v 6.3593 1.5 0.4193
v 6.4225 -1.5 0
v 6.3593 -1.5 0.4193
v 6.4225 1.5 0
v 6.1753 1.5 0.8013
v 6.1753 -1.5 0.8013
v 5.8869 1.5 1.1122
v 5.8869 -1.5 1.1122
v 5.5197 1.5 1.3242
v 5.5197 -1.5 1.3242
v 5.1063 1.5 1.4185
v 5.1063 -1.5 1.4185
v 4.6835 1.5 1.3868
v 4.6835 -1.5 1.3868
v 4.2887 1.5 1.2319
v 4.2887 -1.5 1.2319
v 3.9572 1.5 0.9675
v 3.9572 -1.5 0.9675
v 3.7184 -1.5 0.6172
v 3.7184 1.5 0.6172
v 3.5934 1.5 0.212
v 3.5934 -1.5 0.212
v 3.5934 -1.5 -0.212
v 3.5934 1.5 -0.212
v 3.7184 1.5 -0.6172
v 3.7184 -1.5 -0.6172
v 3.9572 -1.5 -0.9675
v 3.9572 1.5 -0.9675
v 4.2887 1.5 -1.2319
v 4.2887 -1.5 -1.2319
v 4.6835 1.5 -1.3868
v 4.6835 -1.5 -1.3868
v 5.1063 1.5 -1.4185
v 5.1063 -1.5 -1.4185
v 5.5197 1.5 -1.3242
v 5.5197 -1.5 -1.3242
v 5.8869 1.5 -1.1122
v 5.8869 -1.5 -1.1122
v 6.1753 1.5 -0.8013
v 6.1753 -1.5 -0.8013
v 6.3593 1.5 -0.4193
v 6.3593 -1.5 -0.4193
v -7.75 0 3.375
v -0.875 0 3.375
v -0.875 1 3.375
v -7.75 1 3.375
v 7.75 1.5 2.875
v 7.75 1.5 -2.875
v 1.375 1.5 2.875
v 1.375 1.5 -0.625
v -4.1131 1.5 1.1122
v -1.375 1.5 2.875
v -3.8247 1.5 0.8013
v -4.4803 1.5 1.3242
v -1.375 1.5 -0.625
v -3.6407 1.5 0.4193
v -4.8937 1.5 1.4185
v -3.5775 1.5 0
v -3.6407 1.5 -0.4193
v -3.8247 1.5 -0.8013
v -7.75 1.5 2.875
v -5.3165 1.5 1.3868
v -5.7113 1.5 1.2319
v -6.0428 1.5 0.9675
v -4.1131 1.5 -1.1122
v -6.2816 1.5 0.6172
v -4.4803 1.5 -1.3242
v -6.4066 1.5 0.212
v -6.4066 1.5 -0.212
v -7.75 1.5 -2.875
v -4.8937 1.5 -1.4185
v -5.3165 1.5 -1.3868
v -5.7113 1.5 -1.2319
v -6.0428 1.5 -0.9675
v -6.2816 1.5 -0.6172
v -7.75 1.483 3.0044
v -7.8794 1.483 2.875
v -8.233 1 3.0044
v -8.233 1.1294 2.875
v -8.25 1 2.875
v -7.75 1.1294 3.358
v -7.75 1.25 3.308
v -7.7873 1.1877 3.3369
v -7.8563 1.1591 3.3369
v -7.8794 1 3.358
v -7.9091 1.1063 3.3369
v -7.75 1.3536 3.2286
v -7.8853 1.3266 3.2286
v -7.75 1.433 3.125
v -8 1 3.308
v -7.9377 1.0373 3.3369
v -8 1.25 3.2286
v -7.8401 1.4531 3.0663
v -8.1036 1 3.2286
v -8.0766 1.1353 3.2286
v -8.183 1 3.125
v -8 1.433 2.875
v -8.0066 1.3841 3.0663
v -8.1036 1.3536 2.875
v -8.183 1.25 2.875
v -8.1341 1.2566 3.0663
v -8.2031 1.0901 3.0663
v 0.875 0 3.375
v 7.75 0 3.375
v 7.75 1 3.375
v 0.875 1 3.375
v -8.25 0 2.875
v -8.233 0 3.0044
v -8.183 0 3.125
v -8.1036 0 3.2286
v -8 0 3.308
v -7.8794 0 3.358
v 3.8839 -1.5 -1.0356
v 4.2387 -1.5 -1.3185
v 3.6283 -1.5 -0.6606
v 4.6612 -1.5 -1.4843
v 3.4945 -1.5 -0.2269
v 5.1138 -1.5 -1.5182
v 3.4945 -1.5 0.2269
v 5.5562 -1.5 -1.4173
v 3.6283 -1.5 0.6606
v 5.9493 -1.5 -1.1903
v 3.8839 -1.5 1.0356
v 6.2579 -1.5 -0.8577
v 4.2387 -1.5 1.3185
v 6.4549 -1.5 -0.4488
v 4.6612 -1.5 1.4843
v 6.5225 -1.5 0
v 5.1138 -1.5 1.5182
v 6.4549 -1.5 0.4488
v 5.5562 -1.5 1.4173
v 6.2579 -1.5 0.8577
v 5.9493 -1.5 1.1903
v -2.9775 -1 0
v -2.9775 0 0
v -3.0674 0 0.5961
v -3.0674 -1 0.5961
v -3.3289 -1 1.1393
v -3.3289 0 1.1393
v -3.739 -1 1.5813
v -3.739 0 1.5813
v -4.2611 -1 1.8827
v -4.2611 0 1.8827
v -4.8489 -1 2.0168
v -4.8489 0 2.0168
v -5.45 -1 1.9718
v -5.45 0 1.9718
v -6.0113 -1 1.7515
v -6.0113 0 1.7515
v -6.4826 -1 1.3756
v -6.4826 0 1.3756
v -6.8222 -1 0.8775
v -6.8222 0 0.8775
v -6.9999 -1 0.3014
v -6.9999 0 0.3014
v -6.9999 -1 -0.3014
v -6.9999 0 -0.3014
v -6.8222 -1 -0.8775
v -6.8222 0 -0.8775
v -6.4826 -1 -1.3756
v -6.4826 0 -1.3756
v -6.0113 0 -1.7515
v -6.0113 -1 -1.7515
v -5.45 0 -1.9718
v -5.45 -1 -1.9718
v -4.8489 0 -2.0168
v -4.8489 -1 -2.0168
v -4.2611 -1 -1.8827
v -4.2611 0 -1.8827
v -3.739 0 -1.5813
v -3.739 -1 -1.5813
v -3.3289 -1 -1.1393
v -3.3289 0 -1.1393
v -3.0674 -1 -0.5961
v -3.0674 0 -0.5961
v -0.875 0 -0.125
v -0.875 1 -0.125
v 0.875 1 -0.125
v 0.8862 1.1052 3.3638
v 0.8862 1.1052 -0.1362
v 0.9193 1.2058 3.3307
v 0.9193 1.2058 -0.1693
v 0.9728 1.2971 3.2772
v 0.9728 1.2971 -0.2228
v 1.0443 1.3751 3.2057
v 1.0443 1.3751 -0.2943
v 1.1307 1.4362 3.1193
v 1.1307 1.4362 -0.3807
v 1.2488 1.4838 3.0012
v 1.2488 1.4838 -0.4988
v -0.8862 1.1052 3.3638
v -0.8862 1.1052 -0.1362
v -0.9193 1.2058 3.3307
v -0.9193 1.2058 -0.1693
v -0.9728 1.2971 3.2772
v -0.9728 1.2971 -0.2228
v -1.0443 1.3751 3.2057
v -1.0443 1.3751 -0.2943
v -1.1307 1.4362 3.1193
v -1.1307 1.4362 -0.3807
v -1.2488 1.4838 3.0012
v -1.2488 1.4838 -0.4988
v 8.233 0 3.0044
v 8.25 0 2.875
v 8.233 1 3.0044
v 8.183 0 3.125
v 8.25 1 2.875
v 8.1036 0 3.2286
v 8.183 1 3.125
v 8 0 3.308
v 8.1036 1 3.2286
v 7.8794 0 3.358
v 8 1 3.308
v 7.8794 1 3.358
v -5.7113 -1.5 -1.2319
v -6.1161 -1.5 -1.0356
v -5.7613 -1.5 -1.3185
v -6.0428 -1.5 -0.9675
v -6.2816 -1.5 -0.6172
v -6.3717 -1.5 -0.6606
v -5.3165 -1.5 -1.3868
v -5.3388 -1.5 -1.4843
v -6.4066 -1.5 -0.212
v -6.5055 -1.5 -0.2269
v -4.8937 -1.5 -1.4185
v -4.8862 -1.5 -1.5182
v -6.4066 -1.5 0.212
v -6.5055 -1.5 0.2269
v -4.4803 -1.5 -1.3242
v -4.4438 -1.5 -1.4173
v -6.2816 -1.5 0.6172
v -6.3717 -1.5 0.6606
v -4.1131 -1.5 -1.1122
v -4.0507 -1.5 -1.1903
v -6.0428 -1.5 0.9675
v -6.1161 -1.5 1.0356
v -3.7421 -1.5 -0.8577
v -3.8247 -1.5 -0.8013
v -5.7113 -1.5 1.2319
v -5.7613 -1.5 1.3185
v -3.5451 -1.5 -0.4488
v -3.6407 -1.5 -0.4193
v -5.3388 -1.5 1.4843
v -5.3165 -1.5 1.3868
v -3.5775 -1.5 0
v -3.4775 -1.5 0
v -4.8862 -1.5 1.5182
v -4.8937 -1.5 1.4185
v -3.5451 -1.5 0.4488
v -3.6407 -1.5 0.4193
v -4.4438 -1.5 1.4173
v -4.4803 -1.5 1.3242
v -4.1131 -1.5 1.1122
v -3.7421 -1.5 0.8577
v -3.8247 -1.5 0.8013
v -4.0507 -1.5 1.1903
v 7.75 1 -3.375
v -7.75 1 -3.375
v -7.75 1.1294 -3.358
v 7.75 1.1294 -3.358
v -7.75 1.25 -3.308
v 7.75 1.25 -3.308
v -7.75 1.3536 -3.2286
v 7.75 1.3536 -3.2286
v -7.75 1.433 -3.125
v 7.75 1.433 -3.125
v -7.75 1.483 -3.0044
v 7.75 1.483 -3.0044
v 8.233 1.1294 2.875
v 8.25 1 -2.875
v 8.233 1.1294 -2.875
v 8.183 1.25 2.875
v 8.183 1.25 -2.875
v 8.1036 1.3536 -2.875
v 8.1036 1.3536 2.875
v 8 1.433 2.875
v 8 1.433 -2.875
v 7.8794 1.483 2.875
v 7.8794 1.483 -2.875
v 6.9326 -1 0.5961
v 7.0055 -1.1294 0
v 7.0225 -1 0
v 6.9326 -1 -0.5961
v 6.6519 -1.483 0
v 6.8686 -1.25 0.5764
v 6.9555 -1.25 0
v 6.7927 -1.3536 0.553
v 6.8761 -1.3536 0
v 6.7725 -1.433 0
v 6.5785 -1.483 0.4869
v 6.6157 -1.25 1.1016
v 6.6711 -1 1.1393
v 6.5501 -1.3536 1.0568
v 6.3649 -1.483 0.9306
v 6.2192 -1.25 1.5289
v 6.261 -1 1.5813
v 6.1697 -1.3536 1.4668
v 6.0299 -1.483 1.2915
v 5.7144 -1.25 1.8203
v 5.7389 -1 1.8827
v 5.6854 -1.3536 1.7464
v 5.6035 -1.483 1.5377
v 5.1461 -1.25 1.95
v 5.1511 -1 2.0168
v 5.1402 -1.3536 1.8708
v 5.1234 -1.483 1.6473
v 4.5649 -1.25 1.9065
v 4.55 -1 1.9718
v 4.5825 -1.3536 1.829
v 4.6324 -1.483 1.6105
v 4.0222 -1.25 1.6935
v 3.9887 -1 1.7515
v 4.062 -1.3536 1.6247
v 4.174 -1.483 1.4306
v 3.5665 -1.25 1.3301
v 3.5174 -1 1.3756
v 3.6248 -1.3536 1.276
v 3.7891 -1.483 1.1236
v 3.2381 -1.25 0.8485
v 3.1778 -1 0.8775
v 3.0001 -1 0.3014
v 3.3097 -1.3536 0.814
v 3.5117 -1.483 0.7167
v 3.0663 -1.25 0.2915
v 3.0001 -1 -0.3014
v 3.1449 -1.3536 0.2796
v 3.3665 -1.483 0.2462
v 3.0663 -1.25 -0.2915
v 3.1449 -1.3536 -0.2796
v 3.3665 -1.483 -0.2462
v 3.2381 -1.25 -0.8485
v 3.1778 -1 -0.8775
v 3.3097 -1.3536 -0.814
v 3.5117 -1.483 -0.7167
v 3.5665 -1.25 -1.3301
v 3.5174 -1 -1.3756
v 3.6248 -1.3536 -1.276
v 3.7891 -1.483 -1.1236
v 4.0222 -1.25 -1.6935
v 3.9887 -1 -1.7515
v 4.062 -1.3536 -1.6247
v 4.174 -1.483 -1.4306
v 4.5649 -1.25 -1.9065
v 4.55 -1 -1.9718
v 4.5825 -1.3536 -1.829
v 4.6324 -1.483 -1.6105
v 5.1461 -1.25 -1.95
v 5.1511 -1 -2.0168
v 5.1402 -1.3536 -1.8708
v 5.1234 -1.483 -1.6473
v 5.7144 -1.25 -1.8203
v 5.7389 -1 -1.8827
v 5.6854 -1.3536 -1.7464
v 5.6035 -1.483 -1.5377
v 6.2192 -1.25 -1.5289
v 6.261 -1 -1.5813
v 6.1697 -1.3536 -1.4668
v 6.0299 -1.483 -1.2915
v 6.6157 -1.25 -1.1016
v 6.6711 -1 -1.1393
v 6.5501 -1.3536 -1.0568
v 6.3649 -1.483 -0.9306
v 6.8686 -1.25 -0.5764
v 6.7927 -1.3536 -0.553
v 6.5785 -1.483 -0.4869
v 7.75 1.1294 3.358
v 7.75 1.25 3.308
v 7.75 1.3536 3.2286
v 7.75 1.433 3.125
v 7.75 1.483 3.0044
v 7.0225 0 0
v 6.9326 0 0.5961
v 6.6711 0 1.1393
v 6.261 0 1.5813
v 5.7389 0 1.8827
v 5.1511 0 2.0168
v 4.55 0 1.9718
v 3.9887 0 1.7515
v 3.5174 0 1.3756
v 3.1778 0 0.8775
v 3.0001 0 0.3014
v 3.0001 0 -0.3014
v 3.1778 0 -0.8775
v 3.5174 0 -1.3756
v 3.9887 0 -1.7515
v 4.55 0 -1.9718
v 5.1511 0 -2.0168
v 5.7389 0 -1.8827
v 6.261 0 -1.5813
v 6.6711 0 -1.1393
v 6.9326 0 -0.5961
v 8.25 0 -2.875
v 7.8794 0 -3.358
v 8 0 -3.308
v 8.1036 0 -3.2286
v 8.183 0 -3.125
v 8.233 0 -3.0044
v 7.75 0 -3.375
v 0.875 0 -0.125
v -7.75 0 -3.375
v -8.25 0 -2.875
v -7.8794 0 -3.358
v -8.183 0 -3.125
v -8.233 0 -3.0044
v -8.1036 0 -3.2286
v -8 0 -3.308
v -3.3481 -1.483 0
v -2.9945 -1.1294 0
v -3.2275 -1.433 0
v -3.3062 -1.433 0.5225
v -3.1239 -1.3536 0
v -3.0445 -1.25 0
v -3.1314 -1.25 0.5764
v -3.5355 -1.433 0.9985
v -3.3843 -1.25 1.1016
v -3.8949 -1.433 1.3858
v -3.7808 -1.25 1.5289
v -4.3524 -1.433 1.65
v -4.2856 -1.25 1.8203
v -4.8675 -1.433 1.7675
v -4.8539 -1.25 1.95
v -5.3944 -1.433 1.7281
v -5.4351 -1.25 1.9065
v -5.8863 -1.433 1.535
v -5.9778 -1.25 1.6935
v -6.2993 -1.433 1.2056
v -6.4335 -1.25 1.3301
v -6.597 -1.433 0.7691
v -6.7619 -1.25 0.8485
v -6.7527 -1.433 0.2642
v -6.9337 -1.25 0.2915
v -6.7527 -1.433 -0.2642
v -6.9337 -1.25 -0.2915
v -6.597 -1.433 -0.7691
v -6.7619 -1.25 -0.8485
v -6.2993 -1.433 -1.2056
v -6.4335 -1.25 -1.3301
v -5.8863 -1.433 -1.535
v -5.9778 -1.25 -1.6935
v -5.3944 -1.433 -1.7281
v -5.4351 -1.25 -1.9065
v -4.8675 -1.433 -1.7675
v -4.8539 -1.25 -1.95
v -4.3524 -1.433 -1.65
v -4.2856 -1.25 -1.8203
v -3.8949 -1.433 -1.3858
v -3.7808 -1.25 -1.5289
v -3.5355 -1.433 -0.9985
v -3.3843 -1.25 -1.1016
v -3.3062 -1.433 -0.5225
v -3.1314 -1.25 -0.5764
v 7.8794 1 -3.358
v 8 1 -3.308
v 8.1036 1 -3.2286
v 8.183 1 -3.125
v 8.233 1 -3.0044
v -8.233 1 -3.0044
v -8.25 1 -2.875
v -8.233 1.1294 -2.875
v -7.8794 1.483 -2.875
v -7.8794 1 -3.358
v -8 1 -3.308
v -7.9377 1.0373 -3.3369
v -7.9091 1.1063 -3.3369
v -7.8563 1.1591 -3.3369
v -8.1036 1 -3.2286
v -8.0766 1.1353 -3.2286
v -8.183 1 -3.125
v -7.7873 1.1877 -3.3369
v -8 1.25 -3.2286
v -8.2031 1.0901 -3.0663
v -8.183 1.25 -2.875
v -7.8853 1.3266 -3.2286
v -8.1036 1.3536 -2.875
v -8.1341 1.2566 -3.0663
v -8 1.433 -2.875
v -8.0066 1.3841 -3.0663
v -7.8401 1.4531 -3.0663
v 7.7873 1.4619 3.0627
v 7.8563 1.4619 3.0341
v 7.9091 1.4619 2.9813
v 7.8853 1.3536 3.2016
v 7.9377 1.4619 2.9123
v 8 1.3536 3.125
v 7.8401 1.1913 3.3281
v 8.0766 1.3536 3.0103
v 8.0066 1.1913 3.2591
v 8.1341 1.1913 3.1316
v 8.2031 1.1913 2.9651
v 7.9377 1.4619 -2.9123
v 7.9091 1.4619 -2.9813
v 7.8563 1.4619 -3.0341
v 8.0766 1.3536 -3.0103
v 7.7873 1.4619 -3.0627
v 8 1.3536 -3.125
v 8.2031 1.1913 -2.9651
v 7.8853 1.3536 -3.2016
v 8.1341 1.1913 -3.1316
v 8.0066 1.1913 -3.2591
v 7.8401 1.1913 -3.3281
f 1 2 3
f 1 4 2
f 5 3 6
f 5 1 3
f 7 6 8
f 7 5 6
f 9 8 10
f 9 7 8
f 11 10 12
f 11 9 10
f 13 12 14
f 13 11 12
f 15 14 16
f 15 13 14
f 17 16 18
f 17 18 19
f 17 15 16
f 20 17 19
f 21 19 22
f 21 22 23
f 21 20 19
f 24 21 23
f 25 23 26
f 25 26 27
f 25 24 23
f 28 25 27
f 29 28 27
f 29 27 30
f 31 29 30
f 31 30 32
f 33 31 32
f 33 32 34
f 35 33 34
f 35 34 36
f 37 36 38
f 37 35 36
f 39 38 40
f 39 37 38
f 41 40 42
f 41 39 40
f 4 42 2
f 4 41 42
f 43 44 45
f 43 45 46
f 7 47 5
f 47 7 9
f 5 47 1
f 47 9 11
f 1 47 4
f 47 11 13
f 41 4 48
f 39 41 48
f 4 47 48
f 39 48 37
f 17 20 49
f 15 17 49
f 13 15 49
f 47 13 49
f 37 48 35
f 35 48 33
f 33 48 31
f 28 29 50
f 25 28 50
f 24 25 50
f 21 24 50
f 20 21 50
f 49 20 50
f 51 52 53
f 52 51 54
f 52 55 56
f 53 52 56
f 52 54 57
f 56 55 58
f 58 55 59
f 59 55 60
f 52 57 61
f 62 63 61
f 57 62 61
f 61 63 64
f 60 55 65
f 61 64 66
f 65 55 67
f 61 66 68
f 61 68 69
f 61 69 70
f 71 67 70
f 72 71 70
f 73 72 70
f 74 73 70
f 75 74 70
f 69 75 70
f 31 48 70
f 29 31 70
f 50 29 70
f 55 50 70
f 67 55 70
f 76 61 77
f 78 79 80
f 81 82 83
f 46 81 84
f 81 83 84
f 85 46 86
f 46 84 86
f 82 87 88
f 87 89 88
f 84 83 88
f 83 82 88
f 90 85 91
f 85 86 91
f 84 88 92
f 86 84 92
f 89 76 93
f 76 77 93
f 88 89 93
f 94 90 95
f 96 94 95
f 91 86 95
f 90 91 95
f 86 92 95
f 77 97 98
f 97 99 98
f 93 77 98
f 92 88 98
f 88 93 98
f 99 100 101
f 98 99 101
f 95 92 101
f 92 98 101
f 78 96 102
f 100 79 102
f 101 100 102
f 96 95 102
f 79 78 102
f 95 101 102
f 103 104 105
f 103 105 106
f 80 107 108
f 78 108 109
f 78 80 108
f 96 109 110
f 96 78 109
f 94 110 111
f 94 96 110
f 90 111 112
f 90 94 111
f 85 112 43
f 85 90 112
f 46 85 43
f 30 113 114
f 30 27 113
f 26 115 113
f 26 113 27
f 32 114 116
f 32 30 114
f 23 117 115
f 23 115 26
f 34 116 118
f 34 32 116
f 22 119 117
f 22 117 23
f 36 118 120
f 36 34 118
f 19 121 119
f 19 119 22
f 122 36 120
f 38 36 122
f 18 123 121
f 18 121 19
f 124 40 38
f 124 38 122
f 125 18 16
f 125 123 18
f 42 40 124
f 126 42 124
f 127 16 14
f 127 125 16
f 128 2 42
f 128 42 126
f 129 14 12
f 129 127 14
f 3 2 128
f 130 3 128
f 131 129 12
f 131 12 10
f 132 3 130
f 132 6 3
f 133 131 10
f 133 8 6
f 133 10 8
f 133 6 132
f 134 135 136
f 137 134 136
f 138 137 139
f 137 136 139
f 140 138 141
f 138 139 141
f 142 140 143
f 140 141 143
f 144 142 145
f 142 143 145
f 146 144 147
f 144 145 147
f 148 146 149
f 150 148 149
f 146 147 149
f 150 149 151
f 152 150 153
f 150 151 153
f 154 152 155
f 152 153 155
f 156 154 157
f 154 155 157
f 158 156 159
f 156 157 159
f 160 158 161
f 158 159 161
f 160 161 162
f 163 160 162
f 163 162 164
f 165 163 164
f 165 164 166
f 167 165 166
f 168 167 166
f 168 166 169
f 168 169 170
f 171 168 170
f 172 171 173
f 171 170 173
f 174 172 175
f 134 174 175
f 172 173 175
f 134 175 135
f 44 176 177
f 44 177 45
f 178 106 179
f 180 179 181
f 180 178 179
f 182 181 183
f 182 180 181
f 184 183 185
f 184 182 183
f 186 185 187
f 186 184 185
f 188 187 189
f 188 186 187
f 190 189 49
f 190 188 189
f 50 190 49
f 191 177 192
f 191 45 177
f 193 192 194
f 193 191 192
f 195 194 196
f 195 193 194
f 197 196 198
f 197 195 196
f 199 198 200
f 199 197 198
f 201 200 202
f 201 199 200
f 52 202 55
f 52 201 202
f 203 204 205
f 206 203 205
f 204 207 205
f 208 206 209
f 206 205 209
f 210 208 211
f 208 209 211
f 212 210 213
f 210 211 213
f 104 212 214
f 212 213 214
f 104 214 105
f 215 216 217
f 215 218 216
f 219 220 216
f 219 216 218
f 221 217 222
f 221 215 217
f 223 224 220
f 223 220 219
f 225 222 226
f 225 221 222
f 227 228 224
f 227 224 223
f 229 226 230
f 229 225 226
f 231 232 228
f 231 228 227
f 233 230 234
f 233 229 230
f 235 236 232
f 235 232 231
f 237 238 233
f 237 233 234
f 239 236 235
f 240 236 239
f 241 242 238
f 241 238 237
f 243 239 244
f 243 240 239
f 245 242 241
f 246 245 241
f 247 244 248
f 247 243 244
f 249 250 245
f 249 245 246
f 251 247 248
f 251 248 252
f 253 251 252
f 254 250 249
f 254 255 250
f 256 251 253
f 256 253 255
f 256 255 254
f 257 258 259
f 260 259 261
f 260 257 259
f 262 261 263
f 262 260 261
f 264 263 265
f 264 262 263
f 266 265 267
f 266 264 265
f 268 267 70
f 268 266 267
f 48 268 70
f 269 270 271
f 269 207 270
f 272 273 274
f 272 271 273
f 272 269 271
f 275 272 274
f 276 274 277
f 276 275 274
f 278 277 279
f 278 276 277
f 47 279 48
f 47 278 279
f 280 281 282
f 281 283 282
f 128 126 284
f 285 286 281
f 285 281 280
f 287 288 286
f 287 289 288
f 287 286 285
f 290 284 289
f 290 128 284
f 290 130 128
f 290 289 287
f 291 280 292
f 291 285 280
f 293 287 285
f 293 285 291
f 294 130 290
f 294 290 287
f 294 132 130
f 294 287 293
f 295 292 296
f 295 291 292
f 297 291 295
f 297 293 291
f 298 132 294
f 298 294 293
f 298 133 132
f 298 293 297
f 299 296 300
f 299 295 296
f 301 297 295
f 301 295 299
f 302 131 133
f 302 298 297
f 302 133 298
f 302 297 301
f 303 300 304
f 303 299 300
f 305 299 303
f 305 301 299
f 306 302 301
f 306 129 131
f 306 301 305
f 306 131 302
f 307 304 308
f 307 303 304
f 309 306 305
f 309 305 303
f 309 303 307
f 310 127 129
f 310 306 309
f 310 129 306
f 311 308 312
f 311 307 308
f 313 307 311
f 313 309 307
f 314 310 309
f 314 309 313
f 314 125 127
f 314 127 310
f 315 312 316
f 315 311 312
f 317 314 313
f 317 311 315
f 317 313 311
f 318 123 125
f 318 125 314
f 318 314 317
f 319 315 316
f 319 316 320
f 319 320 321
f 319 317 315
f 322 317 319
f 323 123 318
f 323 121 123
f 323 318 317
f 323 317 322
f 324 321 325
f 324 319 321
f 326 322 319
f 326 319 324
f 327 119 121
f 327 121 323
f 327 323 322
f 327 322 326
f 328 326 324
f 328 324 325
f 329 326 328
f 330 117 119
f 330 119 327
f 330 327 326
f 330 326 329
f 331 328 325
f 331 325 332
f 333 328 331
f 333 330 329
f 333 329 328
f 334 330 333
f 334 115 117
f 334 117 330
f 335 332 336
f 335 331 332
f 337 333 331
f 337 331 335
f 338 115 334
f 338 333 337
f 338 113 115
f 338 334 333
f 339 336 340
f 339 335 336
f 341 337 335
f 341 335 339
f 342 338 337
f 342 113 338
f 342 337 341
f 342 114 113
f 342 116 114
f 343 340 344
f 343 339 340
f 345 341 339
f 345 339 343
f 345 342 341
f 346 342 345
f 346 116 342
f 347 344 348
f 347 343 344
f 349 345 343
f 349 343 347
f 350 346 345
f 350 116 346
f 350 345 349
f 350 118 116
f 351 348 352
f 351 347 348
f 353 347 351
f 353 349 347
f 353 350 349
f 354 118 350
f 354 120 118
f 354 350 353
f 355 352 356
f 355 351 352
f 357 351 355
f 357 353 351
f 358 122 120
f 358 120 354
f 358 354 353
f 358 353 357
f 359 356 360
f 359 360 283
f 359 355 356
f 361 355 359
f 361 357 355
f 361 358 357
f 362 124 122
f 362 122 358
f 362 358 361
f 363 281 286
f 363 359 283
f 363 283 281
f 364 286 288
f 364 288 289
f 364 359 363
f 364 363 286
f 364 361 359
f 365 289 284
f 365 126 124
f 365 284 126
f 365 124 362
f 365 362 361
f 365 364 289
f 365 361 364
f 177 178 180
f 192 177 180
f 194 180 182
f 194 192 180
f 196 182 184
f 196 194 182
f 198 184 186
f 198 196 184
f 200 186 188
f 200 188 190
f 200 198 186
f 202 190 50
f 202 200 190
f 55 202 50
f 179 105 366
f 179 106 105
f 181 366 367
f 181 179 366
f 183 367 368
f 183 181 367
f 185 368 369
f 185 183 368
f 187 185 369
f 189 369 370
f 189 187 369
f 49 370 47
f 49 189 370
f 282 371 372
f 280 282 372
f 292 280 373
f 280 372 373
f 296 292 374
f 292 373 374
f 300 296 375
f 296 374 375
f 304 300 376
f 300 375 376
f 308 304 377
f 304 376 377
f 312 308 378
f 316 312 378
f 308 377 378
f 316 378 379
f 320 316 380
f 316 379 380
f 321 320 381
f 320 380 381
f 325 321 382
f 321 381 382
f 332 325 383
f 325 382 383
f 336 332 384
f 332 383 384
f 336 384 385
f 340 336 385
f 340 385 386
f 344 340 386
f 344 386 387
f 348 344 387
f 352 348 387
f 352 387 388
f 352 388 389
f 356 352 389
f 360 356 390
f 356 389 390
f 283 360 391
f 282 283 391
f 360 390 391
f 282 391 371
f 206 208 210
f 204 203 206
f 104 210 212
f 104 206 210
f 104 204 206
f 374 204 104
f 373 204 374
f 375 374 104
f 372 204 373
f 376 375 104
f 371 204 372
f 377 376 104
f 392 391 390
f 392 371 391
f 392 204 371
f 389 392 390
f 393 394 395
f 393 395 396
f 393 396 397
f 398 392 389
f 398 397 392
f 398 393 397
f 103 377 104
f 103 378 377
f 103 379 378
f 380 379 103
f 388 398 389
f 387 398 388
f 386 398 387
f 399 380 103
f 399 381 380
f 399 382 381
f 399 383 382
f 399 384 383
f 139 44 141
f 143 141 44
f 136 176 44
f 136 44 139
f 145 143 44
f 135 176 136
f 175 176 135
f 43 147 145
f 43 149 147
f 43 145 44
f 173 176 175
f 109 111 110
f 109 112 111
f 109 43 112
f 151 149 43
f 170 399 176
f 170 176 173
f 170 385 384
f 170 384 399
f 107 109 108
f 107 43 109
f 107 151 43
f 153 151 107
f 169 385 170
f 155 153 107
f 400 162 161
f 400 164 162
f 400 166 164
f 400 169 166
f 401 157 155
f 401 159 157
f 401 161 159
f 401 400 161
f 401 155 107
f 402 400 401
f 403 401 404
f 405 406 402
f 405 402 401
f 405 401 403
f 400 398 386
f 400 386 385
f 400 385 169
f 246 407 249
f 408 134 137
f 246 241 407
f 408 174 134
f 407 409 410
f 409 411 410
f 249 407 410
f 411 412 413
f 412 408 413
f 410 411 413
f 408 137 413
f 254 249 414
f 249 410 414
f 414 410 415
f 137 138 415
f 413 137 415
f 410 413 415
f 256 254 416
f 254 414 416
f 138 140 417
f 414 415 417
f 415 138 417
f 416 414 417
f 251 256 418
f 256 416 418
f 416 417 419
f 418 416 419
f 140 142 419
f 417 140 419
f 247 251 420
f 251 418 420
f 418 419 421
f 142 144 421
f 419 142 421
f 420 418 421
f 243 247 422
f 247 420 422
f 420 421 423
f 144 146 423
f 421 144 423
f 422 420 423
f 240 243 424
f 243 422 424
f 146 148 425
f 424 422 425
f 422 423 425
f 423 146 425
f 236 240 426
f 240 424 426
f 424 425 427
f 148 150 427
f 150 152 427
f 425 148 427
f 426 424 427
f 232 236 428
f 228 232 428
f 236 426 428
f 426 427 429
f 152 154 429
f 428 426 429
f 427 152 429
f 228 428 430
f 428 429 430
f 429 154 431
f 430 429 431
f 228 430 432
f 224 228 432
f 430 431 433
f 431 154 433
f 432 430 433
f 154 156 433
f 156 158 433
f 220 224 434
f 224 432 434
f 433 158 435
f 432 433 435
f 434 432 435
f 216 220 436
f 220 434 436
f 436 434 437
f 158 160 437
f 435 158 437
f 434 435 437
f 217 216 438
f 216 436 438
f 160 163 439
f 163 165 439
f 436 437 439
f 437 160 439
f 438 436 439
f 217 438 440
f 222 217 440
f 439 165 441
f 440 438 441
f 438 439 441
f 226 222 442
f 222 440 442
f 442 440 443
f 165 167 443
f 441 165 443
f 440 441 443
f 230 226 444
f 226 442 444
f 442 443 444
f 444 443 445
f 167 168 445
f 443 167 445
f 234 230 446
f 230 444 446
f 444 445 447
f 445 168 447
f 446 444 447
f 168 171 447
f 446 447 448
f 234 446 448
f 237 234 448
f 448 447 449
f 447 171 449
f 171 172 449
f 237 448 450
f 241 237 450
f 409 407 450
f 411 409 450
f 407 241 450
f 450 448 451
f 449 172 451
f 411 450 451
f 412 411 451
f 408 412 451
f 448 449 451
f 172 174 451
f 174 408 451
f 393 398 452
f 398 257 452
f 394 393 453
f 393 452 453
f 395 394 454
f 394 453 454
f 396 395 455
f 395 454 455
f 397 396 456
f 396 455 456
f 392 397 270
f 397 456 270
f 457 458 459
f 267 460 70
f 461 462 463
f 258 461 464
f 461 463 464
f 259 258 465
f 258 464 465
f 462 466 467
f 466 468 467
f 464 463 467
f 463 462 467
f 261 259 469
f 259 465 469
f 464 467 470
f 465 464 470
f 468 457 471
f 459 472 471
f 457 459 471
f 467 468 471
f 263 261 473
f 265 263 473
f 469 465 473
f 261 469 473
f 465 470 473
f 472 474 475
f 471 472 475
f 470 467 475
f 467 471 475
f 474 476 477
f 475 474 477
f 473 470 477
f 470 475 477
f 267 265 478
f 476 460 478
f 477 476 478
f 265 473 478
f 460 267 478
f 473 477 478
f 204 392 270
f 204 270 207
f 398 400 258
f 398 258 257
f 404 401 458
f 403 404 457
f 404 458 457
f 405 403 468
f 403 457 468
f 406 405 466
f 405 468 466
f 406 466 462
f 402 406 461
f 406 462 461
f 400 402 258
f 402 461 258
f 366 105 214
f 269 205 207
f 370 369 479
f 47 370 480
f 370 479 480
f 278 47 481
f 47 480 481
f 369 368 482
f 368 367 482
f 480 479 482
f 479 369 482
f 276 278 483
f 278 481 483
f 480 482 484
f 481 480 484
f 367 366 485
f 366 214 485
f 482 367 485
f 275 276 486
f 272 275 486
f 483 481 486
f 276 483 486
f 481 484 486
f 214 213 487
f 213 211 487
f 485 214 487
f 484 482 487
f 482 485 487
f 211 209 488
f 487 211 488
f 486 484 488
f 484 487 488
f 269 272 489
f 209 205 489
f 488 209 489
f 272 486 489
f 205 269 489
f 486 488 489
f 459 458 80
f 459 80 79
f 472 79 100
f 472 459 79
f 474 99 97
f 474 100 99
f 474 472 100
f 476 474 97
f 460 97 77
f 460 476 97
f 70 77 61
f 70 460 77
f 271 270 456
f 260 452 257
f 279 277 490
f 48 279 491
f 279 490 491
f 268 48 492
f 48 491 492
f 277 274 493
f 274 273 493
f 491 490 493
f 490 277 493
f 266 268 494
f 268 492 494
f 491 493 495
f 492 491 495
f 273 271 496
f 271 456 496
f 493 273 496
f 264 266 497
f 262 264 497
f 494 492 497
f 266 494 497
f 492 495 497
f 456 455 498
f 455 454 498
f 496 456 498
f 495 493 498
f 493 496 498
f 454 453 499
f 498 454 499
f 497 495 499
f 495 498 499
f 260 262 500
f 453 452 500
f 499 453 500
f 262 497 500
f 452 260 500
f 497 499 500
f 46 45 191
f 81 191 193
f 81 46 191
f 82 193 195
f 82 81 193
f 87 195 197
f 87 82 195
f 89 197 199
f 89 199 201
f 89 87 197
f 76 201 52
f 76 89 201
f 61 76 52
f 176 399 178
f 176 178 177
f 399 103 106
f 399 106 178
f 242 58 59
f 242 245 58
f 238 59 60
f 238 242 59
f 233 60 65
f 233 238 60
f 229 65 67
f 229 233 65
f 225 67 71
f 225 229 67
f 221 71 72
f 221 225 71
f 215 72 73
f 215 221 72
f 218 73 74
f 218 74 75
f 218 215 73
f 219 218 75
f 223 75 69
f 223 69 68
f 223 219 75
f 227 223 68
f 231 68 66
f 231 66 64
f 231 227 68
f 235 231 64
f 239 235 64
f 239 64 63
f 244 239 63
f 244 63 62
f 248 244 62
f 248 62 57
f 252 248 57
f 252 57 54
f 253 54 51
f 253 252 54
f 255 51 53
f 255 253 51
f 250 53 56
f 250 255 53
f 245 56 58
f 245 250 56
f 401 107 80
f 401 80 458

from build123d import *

# Parameters (mm, degrees)
SKETCH1_R           = 1.4225
BOSS_EXTRUDE1_DEPTH = 1.5
SKETCH2_R           = 2.0225
SKETCH2_R_2         = 1.4225
BOSS_EXTRUDE2_DEPTH = 1.5
FILLET1_R           = 0.5
FILLET2_R           = 0.5


with BuildPart() as part:
    # Sketch1 → Boss-Extrude1 (new body)
    with BuildSketch(Plane(origin=(0, 0, 0), x_dir=(1, 0, 0), z_dir=(0, 1, 0))):
        Polygon((-8.25, -3.375), (-8.25, 3.375), (8.25, 3.375), (8.25, -3.375), (0.875, -3.375), (0.875, 0.125), (-0.875, 0.125), (-0.875, -3.375), align=None)
        with Locations((-5, 0)):
            Circle(SKETCH1_R, mode=Mode.SUBTRACT)
        with Locations((5, 0)):
            Circle(SKETCH1_R, mode=Mode.SUBTRACT)
    extrude(amount=BOSS_EXTRUDE1_DEPTH)

    # Sketch2 → Boss-Extrude2 (add)
    with BuildSketch(Plane.XZ):
        with Locations((5, 0)):
            Circle(SKETCH2_R)
        with Locations((5, 0)):
            Circle(SKETCH2_R_2, mode=Mode.SUBTRACT)
        with Locations((-5, 0)):
            Circle(SKETCH2_R)
        with Locations((-5, 0)):
            Circle(SKETCH2_R_2, mode=Mode.SUBTRACT)
    extrude(amount=BOSS_EXTRUDE2_DEPTH)

    # Fillet1
    fillet1_edges = [part.edges().sort_by_distance(p)[0] for p in [
        (2.9775, -1.5, 0),
        (-7.0225, -1.5, 0),
    ]]
    fillet(fillet1_edges, radius=FILLET1_R)

    # Fillet2
    fillet2_edges = [part.edges().sort_by_distance(p)[0] for p in [
        (-8.25, 1.5, 0),
        (-4.5625, 1.5, 3.375),
        (8.25, 0.75, 3.375),
        (-8.25, 0.75, 3.375),
        (-8.25, 0.75, -3.375),
        (8.25, 0.75, -3.375),
        (-0.875, 1.5, 1.625),
        (0, 1.5, -0.125),
        (0.875, 1.5, 1.625),
        (4.5625, 1.5, 3.375),
        (8.25, 1.5, 0),
        (0, 1.5, -3.375),
    ]]
    fillet(fillet2_edges, radius=FILLET2_R)


solid = part.part
